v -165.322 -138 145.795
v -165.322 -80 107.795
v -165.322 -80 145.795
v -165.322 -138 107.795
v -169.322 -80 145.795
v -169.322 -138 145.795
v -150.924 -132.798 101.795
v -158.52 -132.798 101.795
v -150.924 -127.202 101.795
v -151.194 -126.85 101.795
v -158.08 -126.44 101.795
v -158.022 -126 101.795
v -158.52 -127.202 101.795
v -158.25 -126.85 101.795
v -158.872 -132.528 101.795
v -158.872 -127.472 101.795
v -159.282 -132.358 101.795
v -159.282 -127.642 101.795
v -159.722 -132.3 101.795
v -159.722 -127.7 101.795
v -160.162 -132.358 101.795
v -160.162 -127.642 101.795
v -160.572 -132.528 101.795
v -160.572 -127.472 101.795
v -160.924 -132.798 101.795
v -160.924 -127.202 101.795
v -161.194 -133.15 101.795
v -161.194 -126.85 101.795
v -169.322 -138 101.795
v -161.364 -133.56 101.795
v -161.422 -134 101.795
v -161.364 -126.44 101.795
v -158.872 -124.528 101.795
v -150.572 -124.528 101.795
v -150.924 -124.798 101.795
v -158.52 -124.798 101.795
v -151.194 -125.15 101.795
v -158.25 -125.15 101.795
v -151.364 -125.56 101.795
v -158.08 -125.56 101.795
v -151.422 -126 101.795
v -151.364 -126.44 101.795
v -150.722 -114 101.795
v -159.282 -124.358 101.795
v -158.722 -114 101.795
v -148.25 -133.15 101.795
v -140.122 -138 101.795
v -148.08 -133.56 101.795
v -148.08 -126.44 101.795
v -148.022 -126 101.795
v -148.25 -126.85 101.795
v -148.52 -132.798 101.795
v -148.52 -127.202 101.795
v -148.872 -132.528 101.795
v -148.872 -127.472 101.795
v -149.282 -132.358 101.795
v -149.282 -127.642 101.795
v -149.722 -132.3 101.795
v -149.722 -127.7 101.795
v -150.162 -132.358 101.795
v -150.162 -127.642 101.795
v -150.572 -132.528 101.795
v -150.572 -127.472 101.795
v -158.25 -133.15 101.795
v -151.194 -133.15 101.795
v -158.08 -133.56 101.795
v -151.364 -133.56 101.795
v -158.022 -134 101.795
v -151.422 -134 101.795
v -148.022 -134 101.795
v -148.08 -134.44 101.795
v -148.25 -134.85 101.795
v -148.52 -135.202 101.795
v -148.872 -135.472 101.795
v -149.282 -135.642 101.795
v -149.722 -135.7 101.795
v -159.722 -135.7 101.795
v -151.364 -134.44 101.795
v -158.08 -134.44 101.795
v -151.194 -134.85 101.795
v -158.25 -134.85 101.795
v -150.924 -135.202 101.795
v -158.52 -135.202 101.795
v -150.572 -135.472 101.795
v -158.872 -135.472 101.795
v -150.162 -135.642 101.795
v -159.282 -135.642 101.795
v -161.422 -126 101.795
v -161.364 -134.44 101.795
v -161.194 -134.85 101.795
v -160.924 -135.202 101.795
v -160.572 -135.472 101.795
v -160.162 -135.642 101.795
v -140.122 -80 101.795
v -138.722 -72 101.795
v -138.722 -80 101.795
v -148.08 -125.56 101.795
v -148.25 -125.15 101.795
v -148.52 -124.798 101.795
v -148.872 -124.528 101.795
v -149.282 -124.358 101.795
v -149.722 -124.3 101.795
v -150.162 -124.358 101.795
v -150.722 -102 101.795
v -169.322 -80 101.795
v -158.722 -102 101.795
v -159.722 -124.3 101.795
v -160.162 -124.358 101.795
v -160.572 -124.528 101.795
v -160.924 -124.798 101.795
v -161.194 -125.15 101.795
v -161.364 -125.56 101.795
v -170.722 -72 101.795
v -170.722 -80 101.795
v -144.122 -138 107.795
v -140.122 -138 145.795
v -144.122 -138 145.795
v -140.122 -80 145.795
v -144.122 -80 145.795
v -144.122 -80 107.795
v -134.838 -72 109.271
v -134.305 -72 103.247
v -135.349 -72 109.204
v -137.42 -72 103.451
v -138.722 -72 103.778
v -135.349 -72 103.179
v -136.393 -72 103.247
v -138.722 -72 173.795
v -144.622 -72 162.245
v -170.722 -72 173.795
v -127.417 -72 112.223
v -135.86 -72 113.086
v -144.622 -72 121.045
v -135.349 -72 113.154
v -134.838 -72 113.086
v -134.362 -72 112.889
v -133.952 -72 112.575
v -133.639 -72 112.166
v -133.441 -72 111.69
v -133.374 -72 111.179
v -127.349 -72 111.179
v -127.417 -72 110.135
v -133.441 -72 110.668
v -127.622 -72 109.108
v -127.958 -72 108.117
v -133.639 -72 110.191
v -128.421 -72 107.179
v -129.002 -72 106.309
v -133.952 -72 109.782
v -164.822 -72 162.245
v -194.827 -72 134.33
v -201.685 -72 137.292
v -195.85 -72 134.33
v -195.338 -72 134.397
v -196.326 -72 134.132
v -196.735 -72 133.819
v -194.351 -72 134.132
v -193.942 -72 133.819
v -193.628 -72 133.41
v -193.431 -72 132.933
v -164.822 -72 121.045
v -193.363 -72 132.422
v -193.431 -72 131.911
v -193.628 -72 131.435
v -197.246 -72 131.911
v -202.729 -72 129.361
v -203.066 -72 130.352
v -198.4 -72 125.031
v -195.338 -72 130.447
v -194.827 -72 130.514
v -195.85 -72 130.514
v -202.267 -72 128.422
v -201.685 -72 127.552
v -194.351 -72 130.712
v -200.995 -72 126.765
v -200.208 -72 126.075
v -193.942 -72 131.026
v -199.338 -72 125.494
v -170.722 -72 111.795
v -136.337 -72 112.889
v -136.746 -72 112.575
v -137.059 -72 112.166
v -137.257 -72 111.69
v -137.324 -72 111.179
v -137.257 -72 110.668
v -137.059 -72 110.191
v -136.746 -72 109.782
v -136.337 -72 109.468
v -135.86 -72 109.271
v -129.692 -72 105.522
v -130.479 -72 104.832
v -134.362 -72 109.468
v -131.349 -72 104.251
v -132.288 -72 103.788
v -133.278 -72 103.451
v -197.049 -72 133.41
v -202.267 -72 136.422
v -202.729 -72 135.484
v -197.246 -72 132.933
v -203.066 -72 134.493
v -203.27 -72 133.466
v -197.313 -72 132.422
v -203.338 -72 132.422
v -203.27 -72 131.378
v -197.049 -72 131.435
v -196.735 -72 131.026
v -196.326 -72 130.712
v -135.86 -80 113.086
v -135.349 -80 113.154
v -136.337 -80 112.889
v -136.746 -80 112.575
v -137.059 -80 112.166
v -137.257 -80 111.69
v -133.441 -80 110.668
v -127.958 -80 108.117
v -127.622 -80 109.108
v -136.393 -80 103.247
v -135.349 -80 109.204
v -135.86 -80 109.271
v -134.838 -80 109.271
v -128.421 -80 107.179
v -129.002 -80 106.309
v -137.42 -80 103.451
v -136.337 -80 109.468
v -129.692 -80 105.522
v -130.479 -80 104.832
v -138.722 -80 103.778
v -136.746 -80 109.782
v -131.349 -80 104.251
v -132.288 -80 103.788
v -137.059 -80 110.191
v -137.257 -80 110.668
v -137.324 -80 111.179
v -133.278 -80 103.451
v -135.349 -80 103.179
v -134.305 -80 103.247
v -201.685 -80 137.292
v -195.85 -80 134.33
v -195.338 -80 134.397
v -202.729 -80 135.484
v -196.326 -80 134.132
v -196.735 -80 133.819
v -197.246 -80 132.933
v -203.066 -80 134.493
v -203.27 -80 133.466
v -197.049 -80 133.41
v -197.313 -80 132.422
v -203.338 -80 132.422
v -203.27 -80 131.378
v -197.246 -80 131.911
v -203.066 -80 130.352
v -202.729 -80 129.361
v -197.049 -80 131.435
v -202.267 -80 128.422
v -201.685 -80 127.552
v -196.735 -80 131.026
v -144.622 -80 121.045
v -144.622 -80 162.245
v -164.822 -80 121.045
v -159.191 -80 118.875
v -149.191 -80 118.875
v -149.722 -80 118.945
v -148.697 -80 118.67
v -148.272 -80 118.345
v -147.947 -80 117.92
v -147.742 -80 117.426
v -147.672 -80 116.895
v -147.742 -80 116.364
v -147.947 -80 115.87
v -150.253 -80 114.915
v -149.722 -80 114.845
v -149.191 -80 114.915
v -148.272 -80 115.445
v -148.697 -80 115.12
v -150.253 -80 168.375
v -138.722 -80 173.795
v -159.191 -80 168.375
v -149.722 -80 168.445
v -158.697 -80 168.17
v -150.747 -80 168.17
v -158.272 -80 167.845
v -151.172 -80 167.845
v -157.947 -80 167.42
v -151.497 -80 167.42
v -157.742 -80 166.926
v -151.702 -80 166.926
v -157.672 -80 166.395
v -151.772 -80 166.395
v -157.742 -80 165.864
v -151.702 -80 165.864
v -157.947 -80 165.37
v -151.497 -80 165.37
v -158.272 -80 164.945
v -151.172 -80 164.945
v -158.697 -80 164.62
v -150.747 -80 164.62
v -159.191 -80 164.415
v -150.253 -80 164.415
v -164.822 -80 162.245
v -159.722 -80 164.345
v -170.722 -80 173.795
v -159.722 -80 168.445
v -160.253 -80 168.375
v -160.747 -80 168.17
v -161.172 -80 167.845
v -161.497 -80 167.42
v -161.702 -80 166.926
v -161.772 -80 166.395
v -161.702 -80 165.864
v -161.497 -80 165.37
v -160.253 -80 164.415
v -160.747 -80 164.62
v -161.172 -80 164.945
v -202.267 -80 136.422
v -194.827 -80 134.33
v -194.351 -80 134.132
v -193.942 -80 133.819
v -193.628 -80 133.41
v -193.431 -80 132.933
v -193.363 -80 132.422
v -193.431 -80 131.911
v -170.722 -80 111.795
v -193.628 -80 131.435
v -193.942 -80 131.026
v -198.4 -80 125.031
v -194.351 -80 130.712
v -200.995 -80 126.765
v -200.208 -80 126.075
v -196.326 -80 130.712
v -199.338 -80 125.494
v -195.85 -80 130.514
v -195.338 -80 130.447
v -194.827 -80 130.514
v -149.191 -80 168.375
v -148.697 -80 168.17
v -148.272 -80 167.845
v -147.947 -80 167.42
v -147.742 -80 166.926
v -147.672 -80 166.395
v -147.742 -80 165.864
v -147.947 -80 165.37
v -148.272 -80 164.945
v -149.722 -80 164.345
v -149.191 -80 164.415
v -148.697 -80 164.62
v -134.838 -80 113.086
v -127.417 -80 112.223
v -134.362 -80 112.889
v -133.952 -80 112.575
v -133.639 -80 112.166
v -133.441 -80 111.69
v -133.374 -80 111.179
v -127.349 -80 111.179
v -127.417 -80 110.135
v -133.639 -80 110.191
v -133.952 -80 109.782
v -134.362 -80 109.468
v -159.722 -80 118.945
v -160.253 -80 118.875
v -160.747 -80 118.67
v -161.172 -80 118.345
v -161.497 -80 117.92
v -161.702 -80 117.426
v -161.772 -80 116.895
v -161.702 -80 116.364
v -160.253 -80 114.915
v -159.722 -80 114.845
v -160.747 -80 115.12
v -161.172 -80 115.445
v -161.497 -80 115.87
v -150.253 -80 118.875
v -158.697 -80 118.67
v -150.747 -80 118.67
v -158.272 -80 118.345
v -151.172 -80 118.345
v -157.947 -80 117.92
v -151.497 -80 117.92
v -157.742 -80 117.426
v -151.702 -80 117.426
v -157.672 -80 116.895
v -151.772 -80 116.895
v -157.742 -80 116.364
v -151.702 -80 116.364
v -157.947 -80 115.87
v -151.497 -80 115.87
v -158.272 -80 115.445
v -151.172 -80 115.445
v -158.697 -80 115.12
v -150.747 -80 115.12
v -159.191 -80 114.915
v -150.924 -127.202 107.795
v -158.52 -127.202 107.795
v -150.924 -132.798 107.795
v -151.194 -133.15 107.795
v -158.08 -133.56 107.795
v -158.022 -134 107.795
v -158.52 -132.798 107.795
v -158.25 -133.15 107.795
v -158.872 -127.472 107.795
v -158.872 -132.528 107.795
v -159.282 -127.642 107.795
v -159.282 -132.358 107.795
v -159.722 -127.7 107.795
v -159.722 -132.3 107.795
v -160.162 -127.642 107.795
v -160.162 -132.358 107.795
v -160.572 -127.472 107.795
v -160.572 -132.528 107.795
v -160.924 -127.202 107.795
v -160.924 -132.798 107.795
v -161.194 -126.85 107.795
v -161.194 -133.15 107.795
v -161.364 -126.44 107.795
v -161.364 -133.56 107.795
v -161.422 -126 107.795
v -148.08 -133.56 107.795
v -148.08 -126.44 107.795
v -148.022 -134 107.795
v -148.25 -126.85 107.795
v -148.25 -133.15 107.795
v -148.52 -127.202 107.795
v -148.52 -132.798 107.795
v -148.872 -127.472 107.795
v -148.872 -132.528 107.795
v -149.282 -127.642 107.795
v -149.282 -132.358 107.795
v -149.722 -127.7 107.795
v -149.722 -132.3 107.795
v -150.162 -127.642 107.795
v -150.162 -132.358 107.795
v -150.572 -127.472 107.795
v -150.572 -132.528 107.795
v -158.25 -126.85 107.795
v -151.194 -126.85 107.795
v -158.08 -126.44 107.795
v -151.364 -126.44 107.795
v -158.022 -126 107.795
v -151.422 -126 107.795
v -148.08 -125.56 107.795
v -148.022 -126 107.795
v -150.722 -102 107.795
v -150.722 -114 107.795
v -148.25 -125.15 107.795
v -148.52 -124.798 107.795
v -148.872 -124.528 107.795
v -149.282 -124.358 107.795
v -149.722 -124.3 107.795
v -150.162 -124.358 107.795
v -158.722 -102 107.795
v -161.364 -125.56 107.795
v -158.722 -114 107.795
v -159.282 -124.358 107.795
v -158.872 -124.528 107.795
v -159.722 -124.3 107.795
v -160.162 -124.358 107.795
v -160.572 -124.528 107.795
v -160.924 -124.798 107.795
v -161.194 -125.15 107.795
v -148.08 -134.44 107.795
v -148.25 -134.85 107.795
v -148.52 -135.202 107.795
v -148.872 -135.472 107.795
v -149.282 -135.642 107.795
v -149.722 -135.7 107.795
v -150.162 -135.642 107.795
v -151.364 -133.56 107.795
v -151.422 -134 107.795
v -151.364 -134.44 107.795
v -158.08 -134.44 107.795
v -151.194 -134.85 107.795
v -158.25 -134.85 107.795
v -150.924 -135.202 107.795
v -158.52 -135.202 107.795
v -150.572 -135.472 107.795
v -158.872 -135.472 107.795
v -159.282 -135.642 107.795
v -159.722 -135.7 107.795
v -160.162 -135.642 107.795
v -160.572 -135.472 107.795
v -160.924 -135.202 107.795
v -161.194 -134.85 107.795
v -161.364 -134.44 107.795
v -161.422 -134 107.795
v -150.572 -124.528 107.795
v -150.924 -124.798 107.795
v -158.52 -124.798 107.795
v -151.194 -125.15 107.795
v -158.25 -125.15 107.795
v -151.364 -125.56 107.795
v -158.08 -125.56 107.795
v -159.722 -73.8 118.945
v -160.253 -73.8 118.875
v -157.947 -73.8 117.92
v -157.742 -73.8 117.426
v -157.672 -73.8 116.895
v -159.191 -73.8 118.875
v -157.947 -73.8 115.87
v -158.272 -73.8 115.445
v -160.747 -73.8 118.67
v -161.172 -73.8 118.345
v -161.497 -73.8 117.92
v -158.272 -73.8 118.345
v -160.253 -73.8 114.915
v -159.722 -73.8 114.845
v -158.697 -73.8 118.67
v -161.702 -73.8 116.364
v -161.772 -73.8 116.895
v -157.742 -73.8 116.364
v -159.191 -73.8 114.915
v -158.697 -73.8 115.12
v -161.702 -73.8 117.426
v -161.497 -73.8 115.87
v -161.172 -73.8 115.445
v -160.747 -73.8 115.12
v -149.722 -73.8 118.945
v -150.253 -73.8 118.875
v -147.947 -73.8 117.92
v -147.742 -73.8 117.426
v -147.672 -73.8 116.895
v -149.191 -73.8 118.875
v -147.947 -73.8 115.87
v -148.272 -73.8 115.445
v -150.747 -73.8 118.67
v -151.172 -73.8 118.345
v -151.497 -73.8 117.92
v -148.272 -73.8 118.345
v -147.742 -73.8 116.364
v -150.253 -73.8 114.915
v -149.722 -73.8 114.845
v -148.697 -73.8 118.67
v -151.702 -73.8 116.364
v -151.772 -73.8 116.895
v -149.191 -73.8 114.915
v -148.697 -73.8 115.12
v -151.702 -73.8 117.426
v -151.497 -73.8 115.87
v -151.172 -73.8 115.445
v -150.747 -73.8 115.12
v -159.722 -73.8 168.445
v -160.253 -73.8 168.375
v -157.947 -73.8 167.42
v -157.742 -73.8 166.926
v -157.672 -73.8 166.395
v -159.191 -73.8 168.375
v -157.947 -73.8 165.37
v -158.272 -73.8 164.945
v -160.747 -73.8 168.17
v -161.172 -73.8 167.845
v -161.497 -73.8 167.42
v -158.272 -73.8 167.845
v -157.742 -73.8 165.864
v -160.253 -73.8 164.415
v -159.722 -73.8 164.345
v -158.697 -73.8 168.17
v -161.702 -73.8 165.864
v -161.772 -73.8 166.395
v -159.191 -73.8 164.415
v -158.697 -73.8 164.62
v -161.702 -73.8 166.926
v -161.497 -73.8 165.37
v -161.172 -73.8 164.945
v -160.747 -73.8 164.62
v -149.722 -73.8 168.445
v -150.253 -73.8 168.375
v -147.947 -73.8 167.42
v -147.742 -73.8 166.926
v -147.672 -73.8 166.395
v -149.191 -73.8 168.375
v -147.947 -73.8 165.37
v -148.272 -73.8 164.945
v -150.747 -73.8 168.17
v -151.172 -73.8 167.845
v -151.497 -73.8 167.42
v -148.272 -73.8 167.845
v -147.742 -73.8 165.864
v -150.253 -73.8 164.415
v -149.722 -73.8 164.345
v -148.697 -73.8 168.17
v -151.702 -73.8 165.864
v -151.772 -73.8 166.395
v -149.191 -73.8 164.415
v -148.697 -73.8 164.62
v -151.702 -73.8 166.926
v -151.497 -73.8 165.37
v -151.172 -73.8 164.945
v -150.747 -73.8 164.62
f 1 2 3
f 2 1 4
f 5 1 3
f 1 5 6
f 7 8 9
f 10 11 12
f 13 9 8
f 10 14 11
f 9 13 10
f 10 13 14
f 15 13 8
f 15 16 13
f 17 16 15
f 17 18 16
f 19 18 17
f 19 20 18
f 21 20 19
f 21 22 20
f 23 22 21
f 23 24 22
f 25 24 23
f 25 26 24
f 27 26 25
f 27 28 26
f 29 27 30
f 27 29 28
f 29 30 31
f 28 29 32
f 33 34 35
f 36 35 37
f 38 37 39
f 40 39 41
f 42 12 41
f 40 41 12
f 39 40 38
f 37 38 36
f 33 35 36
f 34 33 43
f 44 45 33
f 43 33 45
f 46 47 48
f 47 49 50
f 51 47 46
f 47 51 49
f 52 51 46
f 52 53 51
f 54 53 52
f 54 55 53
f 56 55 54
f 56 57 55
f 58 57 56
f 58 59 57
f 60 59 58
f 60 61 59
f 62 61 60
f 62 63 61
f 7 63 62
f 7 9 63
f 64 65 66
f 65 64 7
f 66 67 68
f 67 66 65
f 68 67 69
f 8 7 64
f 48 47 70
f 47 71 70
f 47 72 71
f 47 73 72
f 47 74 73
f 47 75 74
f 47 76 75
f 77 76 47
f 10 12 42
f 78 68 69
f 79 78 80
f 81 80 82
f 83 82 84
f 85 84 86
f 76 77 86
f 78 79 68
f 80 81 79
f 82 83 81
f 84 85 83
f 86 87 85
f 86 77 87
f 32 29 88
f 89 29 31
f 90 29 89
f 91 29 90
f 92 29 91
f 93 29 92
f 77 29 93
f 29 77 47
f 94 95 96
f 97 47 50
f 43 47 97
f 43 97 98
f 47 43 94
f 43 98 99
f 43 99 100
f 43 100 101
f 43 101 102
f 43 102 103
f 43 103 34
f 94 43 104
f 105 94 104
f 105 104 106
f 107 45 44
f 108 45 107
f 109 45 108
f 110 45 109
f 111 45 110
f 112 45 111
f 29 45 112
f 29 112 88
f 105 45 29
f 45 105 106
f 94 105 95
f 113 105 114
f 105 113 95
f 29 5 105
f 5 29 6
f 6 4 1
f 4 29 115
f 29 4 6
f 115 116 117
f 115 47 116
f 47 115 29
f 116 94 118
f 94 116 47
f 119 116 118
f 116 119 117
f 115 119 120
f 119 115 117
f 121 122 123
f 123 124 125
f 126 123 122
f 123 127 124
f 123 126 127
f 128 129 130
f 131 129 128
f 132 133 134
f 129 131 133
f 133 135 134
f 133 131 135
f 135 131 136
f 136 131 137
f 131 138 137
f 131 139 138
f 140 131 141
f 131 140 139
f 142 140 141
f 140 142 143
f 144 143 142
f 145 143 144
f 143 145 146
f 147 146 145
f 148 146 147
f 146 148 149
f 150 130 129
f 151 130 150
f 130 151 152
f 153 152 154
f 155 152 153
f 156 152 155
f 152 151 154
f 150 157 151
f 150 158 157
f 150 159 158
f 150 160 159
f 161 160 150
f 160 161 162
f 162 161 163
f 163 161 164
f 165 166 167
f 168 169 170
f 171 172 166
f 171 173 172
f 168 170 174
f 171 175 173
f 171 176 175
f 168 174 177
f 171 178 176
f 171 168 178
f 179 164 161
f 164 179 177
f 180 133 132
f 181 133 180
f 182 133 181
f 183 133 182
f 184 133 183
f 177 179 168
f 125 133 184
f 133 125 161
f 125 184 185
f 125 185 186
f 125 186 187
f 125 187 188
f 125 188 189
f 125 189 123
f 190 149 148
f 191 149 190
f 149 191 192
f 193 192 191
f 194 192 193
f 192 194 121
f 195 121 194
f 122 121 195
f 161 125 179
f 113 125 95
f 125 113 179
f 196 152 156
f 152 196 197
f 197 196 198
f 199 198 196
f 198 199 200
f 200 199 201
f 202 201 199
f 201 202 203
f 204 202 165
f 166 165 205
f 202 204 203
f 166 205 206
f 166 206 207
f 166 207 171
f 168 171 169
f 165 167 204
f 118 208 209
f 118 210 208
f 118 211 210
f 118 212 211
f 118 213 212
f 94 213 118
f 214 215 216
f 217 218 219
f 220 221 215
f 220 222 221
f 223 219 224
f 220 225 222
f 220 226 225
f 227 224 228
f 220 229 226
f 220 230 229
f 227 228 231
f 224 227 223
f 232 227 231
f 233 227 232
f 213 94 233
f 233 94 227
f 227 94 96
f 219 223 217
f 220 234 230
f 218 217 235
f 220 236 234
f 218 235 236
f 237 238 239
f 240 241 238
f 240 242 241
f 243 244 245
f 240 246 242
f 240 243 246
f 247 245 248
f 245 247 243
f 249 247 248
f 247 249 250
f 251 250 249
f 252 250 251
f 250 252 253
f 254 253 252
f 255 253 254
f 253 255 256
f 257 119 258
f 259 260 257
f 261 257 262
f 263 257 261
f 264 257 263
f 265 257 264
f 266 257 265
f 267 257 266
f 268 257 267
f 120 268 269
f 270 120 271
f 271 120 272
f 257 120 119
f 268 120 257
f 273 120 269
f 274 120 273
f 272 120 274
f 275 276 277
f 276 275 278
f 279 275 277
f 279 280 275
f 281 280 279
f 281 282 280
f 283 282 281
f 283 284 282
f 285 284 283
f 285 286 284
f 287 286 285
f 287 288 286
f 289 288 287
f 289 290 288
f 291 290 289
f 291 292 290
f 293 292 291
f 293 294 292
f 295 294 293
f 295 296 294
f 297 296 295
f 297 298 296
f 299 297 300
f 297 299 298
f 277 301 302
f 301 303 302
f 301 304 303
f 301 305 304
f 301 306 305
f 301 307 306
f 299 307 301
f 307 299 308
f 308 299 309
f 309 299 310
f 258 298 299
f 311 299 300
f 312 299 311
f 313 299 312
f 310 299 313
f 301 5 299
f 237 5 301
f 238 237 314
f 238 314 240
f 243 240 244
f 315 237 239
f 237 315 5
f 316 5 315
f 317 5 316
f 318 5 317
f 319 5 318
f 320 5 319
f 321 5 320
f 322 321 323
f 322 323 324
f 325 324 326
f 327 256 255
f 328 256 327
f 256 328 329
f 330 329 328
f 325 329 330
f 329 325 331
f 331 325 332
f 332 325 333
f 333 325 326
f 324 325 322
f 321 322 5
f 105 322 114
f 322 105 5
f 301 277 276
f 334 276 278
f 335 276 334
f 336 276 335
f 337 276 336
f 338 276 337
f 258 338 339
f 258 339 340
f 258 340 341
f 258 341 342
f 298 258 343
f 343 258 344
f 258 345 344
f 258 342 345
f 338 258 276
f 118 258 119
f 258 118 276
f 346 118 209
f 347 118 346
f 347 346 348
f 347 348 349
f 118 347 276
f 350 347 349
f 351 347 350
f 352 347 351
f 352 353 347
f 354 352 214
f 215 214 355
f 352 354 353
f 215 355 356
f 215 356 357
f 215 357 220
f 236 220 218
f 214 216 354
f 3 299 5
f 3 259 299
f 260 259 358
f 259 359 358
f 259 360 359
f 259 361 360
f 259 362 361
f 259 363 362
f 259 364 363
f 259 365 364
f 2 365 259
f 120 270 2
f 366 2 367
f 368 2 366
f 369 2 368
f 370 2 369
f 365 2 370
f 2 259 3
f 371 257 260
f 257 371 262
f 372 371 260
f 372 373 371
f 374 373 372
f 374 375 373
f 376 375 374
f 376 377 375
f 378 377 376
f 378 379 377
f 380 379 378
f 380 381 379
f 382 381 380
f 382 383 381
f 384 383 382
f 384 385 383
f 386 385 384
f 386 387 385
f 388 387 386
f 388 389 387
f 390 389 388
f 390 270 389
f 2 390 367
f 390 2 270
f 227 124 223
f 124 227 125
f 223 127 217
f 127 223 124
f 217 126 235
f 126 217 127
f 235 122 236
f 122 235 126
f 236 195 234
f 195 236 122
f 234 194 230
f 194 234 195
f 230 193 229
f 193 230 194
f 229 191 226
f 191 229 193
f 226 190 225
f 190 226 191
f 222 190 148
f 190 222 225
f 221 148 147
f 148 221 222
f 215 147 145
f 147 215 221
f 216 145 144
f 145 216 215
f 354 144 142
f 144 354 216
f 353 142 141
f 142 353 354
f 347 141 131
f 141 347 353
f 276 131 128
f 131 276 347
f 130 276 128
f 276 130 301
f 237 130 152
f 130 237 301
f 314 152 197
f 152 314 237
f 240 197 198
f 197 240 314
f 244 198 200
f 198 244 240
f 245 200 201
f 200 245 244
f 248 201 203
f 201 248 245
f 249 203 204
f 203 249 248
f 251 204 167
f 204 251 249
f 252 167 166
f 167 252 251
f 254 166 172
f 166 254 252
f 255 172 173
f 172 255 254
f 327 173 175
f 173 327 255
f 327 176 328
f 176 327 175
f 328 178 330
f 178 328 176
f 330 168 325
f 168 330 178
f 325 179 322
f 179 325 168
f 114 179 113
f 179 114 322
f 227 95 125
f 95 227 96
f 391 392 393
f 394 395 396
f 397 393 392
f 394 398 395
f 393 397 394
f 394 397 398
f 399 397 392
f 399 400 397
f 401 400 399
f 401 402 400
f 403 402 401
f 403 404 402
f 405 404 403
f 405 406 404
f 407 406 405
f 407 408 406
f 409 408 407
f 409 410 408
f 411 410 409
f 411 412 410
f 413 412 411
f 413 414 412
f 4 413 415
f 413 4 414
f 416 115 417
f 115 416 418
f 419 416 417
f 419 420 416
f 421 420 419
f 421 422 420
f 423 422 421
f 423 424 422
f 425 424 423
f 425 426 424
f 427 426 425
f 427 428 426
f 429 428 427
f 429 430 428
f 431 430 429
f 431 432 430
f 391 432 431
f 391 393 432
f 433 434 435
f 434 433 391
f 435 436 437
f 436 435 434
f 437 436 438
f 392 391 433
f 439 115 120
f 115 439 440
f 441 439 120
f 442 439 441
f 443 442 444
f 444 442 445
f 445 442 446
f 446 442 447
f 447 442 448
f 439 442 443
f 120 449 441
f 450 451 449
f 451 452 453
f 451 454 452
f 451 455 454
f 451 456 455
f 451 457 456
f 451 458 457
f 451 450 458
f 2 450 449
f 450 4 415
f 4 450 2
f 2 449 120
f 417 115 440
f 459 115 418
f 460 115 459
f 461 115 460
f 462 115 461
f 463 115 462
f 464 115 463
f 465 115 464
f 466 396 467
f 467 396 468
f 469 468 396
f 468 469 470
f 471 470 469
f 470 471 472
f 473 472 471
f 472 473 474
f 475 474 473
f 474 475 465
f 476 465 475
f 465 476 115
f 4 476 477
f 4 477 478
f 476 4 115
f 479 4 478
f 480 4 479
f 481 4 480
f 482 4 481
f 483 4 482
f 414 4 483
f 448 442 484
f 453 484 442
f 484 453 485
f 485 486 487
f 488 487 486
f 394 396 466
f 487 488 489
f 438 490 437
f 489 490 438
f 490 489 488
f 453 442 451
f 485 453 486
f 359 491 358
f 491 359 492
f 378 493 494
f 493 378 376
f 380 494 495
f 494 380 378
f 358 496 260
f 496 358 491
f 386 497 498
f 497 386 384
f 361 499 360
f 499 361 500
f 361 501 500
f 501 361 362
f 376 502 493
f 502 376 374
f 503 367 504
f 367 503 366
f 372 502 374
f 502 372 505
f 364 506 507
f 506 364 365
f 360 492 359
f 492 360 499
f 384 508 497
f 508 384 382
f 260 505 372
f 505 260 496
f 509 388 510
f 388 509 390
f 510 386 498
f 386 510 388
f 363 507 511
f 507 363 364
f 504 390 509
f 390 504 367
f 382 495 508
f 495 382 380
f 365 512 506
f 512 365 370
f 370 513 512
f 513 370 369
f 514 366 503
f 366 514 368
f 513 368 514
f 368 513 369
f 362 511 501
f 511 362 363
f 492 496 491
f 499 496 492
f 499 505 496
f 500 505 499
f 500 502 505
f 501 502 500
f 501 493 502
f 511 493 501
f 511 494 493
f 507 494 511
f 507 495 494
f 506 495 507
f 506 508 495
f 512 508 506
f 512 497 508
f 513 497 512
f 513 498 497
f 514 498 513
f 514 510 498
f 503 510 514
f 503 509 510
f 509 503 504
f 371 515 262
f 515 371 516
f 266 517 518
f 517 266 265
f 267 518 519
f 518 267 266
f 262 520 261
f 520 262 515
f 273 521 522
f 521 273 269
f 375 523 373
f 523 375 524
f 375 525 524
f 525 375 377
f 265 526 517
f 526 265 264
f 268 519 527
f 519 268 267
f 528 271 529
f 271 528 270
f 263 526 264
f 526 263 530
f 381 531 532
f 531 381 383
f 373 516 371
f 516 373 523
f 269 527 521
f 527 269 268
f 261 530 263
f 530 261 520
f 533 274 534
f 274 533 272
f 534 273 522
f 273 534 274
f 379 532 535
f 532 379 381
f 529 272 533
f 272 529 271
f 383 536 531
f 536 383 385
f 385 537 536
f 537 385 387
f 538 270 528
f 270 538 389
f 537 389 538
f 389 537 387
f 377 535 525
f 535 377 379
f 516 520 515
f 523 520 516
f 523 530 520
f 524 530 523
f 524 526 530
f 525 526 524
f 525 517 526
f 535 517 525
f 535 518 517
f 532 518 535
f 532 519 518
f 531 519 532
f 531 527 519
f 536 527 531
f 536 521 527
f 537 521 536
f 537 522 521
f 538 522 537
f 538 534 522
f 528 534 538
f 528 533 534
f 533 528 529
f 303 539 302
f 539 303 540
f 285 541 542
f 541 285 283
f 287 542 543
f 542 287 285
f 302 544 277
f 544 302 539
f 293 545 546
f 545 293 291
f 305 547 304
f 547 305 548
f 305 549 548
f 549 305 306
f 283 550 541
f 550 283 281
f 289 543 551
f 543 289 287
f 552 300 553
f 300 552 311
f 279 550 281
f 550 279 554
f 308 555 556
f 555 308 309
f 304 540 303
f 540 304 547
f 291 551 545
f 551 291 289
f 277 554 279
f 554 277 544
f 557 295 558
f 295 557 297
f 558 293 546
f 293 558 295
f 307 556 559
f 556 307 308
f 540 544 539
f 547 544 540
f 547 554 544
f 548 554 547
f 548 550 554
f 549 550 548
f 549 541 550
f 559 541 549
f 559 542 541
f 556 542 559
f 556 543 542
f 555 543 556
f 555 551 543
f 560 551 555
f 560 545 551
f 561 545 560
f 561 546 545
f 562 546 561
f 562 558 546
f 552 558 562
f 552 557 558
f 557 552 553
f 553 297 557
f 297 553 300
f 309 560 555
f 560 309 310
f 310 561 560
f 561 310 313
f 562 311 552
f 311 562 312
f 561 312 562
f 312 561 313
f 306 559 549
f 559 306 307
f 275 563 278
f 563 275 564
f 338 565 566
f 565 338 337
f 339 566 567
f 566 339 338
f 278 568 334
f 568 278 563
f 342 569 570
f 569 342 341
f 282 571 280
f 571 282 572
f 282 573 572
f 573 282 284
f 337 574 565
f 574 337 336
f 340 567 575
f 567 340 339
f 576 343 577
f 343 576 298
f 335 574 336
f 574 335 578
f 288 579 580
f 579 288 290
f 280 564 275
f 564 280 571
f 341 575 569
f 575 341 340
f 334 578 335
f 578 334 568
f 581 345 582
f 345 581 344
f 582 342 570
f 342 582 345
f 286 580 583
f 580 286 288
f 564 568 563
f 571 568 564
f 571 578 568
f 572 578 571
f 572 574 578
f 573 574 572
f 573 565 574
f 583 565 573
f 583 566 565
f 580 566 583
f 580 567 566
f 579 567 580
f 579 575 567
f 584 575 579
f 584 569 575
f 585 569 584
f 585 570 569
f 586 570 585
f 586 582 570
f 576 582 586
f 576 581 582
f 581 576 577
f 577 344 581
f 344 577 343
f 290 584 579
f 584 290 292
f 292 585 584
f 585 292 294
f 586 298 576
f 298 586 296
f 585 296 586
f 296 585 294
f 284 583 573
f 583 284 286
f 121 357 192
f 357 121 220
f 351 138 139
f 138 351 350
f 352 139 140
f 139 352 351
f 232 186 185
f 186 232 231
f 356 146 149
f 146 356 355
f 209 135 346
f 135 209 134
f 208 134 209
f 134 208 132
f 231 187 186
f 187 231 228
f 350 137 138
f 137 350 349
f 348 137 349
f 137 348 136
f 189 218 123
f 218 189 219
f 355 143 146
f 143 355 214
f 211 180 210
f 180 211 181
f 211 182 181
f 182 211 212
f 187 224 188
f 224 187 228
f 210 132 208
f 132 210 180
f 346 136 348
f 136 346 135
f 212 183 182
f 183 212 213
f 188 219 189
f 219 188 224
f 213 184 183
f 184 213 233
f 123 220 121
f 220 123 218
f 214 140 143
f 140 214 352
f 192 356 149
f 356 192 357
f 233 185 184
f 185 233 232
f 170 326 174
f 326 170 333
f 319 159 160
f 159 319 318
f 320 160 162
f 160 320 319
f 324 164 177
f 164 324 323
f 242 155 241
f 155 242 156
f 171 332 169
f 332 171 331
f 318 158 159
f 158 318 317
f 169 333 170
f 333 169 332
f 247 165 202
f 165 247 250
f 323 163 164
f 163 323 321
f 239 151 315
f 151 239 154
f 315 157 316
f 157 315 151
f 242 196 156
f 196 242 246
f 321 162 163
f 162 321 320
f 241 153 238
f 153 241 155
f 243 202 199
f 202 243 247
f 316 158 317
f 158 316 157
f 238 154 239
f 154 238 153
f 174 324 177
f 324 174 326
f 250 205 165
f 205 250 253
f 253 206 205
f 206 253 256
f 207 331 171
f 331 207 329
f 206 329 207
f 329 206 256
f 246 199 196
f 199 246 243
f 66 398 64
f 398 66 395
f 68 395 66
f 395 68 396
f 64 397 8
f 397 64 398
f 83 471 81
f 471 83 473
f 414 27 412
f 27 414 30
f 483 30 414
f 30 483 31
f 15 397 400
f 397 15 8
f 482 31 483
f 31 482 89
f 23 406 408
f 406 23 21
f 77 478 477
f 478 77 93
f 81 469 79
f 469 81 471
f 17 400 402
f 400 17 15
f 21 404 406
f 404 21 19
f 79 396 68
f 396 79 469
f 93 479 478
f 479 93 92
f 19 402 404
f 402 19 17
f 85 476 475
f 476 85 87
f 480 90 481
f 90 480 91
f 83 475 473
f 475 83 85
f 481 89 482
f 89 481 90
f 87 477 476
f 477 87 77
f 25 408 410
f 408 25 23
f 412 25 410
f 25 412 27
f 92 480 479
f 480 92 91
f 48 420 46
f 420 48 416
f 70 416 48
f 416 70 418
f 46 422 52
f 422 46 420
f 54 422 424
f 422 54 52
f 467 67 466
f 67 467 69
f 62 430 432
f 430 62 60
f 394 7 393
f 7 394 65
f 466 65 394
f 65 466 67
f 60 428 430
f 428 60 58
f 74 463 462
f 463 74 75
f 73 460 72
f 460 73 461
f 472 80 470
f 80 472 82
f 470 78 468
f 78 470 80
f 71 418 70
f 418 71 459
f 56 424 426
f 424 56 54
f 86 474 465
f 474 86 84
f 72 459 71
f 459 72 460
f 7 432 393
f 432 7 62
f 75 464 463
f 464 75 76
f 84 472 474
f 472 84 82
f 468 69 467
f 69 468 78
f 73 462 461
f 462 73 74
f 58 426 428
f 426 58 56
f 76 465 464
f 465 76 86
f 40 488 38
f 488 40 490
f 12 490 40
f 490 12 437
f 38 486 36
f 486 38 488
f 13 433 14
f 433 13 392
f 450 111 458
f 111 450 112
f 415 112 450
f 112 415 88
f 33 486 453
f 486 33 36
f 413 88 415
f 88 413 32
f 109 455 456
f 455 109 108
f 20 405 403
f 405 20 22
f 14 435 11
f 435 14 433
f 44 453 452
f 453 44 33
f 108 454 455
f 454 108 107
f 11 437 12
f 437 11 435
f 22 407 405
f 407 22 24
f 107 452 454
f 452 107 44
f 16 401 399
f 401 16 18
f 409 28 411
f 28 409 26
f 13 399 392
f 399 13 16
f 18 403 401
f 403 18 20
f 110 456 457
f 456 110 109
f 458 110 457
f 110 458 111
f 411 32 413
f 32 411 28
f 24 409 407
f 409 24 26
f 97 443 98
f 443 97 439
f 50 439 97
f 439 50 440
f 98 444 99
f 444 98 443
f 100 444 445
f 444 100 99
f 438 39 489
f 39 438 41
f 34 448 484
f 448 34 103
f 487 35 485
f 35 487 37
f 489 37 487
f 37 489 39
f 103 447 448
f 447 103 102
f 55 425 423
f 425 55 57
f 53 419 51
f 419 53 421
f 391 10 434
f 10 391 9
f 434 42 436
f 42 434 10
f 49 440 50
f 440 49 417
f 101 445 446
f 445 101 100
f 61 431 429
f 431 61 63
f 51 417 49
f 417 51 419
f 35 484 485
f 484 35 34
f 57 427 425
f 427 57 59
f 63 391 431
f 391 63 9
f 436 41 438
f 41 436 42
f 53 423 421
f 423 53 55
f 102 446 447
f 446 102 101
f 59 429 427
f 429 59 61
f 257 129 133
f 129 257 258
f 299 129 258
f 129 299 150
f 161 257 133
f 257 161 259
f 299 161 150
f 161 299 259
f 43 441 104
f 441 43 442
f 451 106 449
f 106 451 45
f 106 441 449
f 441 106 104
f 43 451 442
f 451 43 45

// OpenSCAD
// file: ../machine_frame.scad
// =============================================
// Riftbound Card Sorter — shared machine frame
// =============================================
// Single source of truth for the card path after the Nov 11 redesign
// (suction pick from a motor-raised hopper, raised transport line,
// cradle shuttle sorter). Machine coords as in assembly.scad:
//   X = card travel (hopper -> belt -> tray), Y = across belt (+Y = back,
//   electronics side), Z = up, Z=0 bottom of baseplate tiles.
// `use <machine_frame.scad>` does not import variables, so read these via
// the functions at the bottom.
// =============================================

base_top   = 4;      // top of baseplate tiles
riser_h    = 60;     // conveyor deck raised so cards can FALL into both tray floors
deck_z     = base_top + riser_h;          // rail base / hopper deck reference = 64

// Conveyor (geometry unchanged, just lifted by riser_h)
belt_x0    = -165;   // belt start
belt_x1    = 85;     // belt end
roller_x   = [-140, 60];
rail_in    = 45;     // |Y| of rail inner faces
shaft_z    = deck_z + 15;
card_z     = deck_z + 15 + 11.9;          // top of round belts = card face = 90.9
scan_flat  = [-127, 47];                  // slide-bed backed flat zone (X)

// Scanner
cam_x      = 5;      // lens axis; card centred here for capture (moved from -40 so the hood clears the arm drop zone at X -139..-51)

// Hopper (motor-raised floor keeps top card at card_z)
hopper_x   = -215;   // cavity centre X (Y = 0)

// Baseplate extents (3x3 tiles of 190x180)
base_x     = [-285, 285];
base_y     = [-270, 270];

// Pick & place hand-off
drop_x     = -95;    // card CENTRE when the suction arm releases it onto the belt
                     // (card spans -139..-51: on belts, clear of hopper wall)
drop_clear = 3;      // card underside this far above belt at release (low drop)

// Sorting tray (bottom on baseplate); owner of tray placement may move it in X
tray_floor_lower_z = base_top + 2.5;      // lower slot floor
tray_floor_upper_z = base_top + 65 + 3 + 2.5;  // = 74.5 upper slot floor

// Card
card_w = 63; card_l = 88; card_t = 0.33;  // RAW cards (owner confirmed 2026-11-11: no sleeves), ~1.75 g

// MG996R mounting-tab holes (all three servos: pick arm ch0, shuttle ch1 / ch2).
// ONE value for every mount: hole-centre pitch along the case (49.5, TowerPro
// MG996R drawing) × across it (10), symmetric about the case centre. Clones
// vary (48.5..50 seen); the servo's own tab holes are Ø4.5+ grommet holes, so
// an M3 / M2.5 still lands for ±0.7 mm. MEASURE YOUR SERVO; if it is further
// off, change it here and re-export the arm head and the shuttle end post / riser.
mg996r_hole_pitch = 49.5;
mg996r_hole_dx    = 10;

function frame_base_top()  = base_top;
function frame_riser_h()   = riser_h;
function frame_deck_z()    = deck_z;
function frame_belt_x0()   = belt_x0;
function frame_belt_x1()   = belt_x1;
function frame_roller_x()  = roller_x;
function frame_rail_in()   = rail_in;
function frame_card_z()    = card_z;
function frame_scan_flat() = scan_flat;
function frame_cam_x()     = cam_x;
function frame_hopper_x()  = hopper_x;
function frame_base_x()    = base_x;
function frame_base_y()    = base_y;
function frame_drop_x()    = drop_x;
function frame_drop_clear()= drop_clear;
function frame_tray_floor_lower_z() = tray_floor_lower_z;
function frame_tray_floor_upper_z() = tray_floor_upper_z;
function frame_mg996r_hole_pitch() = mg996r_hole_pitch;
function frame_mg996r_hole_dx()    = mg996r_hole_dx;
// file: hw_common.scad
// Visual-only hardware for the v3 assembly video (render_v2/w_*.scad). Not printed.
// Screws are drawn with the origin at the underside of the head (the bearing face)
// and the tip along `dir` (default straight down). Lengths are nominal (mm).

// rotate so that local -Z points along v
module point_tip(v = [0, 0, -1]) {
    n = norm(v); u = v / n;
    if (u[2] < -0.9999) children();
    else if (u[2] > 0.9999) rotate([180, 0, 0]) children();
    else rotate(a = acos(-u[2]), v = cross([0, 0, -1], u)) children();
}

// socket head cap screw: head Ø5.5 × 3 above the origin, shank down
module shcs(L, d = 3, hd = 5.5, hh = 3) {
    cylinder(d = hd, h = hh, $fn = 20);
    translate([0, 0, -L]) cylinder(d = d, h = L + 0.01, $fn = 12);
}
// button head (ISO 7380)
module bhcs(L, d = 3, hd = 5.7, hh = 1.65) {
    cylinder(d1 = hd, d2 = hd * 0.75, h = hh, $fn = 20);
    translate([0, 0, -L]) cylinder(d = d, h = L + 0.01, $fn = 12);
}
// countersunk (ISO 10642): head top at the origin, cone below it
module csk(L, d = 3, hd = 6) {
    translate([0, 0, -(hd - d) / 2]) cylinder(d1 = d, d2 = hd, h = (hd - d) / 2, $fn = 20);
    translate([0, 0, -L]) cylinder(d = d, h = L, $fn = 12);
}
// set screw (no head), top at the origin
module setscrew(L, d = 3) translate([0, 0, -L]) cylinder(d = d, h = L, $fn = 12);
module hexnut(d = 3, af = 5.5, h = 2.4) difference() {
    cylinder(d = af / cos(30), h = h, $fn = 6);
    translate([0, 0, -1]) cylinder(d = d, h = h + 2, $fn = 12);
}
module washer(d = 3.2, od = 7, t = 0.5) difference() { cylinder(d = od, h = t, $fn = 24); translate([0, 0, -1]) cylinder(d = d, h = t + 2, $fn = 12); }

// place a screw at p with its tip along dir
module at_screw(p, dir = [0, 0, -1]) translate(p) point_tip(dir) children();

// M3 four-prong tee-nut, flange on the board underside at z, barrel up into the board
module teenut(p, z) translate([p[0], p[1], z]) {
    translate([0, 0, -0.9]) difference() { cylinder(d = 13, h = 0.9, $fn = 32); translate([0, 0, -1]) cylinder(d = 3, h = 3, $fn = 12); }
    difference() { cylinder(d = 4.5, h = 5, $fn = 20); translate([0, 0, -1]) cylinder(d = 3, h = 7, $fn = 12); }
    for (a = [45 : 90 : 315]) rotate(a) translate([5.2, -0.7, 0]) cube([1.2, 1.4, 3]);
}

// cable / tube as a hull chain of spheres
module chain(pts, d = 4) for (i = [0 : len(pts) - 2])
    hull() for (p = [pts[i], pts[i + 1]]) translate(p) sphere(d = d, $fn = 12);
// main file
// v3 assembly video: pick-arm parts in machine coordinates (step 8), parked (servo 90°).
// openscad --backend=manifold -D 'part="v3_arm_head"' -o arm_head.stl w_arm.scad
include <../suction_arm.scad>
include <hw_common.scad>
part = "v3_arm_head";
P = part;
th = pa_theta(s_park);
H  = [R * cos(th), 0, R * sin(th)];          // hand origin A' (A-local)
module A() translate([px, 0, pz]) children();
module HAND() A() translate(H) children();
module LIP() HAND() translate([0, 0, -h_cup]) children();   // lip frame (z 0 = free cup lip)

module gdowels() for (g = [[gB, lb_y1], [gC, lc_y1]]) at_xz(g[0]) ycyl(dowel_d / 2, gp_y0, g[1] + 1, 16);
module gsleeves() { at_xz(gB) ycyl(slv_d / 2, gp_y1 - eps, lb_y0 - slv_gap, 24); at_xz(gC) ycyl(slv_d / 2, gp_y1 - eps, lc_y0 - slv_gap, 24); }
module tab_screws() for (h = sv_holes) at_screw([h[0], gp_y0 - sv_tab_t, h[1]], [0, 1, 0]) shcs(8);
module horn_screws() rotate([0, -th, 0]) for (a = [0, 90, 180, 270]) rotate([0, -a - 45, 0])
    at_screw([8, cr_y1 - 3, 0], [0, -1, 0]) shcs(6);
module washers() {
    for (g = [[gB, lb_y1], [gC, lc_y1]]) at_xz(g[0]) ycyl(4.5, g[1], g[1] + 0.5, 20);          // ground pin ends
    translate(H) {
        at_xz(gB) ycyl(4.5, lb_y0 - 0.5, lb_y0, 20);                                         // B' end
        at_xz(gC) ycyl(4.5, lc_y0 - 0.5, lc_y0, 20);                                         // C' end
        ycyl(6.5, cr_y0 - 1.5, cr_y0 - 1.0, 24);                                             // A' tube end (Ø8)
    }
}
module springs() for (s = [-1, 1]) translate([s * rod_dx, 0, sl_z1]) difference() {
    cylinder(d = 5, h = beam_z[0] + h_cup - sl_z1, $fn = 16); translate([0, 0, -1]) cylinder(d = 4.2, h = 40, $fn = 12);
}
module tower_bolts() for (h = foot_holes) at_screw([h[0], h[1], frame_base_top() + foot_t]) shcs(20);
module head_bolts() for (b = hd_bolts) at_screw([px + b[0], b[1], pz + hd_floor[1]]) shcs(12);
// vacuum tube on the arm: barb → loop → through the A' tube → spoke → anchor → down the column
module arm_tube() let(h = [px, 0, pz] + H, bz = h[2] - h_cup + pad_top + web_t + 12)
    chain([[h[0], 0, bz], [h[0] + 9, -8, h[2] - 14], [h[0] + 9, -28, h[2] - 6], [h[0], -34, h[2]],
           [h[0], cr_y0 - 1.5, h[2]], [px, anc_y[1], pz], [px, anc_y[0] - 1, pz], [px, -160, pz],
           [px + 8, -160, pz - 8], [px + 8, -160, 18]], 4);
module zip_ties() for (z = [55, 80]) translate([px, (col_y[0] + 2.5 + 1.1), z + 2]) difference() {
    cube([2 * col_hx + 3, 9, 2.5], center = true); cube([2 * col_hx + 0.6, 6.6, 4], center = true);
}

if (P == "v3_arm_head") A() head();
if (P == "v3_arm_dowels") A() gdowels();
if (P == "v3_arm_servo") A() mg996r();
if (P == "v3_arm_tabscr") A() tab_screws();
if (P == "v3_arm_horn") A() rotate([0, -th, 0]) horn();
if (P == "v3_arm_crank") A() rotate([0, -th, 0]) crank();
if (P == "v3_arm_hornscr") A() horn_screws();
if (P == "v3_arm_gsleeves") A() gsleeves();
if (P == "v3_arm_linkc") A() at_xz(gC) rotate([0, -th, 0]) link(lc_y0);
if (P == "v3_arm_linkb") A() at_xz(gB) rotate([0, -th, 0]) link(lb_y0);
if (P == "v3_arm_hand") HAND() hand();
if (P == "v3_arm_handpins") HAND() hand_pins();
if (P == "v3_arm_washers") A() washers();
if (P == "v3_arm_sled") LIP() sled();
if (P == "v3_arm_pad") LIP() bellows_pad();
if (P == "v3_arm_barb") LIP() barb_fitting();
if (P == "v3_arm_springs") LIP() springs();
if (P == "v3_arm_guidescr") HAND() guide_screws();
if (P == "v3_arm_tower") tower();
if (P == "v3_arm_headbolts") head_bolts();
if (P == "v3_arm_towerbolts") tower_bolts();
if (P == "v3_arm_tube") arm_tube();
if (P == "v3_arm_zipties") zip_ties();
